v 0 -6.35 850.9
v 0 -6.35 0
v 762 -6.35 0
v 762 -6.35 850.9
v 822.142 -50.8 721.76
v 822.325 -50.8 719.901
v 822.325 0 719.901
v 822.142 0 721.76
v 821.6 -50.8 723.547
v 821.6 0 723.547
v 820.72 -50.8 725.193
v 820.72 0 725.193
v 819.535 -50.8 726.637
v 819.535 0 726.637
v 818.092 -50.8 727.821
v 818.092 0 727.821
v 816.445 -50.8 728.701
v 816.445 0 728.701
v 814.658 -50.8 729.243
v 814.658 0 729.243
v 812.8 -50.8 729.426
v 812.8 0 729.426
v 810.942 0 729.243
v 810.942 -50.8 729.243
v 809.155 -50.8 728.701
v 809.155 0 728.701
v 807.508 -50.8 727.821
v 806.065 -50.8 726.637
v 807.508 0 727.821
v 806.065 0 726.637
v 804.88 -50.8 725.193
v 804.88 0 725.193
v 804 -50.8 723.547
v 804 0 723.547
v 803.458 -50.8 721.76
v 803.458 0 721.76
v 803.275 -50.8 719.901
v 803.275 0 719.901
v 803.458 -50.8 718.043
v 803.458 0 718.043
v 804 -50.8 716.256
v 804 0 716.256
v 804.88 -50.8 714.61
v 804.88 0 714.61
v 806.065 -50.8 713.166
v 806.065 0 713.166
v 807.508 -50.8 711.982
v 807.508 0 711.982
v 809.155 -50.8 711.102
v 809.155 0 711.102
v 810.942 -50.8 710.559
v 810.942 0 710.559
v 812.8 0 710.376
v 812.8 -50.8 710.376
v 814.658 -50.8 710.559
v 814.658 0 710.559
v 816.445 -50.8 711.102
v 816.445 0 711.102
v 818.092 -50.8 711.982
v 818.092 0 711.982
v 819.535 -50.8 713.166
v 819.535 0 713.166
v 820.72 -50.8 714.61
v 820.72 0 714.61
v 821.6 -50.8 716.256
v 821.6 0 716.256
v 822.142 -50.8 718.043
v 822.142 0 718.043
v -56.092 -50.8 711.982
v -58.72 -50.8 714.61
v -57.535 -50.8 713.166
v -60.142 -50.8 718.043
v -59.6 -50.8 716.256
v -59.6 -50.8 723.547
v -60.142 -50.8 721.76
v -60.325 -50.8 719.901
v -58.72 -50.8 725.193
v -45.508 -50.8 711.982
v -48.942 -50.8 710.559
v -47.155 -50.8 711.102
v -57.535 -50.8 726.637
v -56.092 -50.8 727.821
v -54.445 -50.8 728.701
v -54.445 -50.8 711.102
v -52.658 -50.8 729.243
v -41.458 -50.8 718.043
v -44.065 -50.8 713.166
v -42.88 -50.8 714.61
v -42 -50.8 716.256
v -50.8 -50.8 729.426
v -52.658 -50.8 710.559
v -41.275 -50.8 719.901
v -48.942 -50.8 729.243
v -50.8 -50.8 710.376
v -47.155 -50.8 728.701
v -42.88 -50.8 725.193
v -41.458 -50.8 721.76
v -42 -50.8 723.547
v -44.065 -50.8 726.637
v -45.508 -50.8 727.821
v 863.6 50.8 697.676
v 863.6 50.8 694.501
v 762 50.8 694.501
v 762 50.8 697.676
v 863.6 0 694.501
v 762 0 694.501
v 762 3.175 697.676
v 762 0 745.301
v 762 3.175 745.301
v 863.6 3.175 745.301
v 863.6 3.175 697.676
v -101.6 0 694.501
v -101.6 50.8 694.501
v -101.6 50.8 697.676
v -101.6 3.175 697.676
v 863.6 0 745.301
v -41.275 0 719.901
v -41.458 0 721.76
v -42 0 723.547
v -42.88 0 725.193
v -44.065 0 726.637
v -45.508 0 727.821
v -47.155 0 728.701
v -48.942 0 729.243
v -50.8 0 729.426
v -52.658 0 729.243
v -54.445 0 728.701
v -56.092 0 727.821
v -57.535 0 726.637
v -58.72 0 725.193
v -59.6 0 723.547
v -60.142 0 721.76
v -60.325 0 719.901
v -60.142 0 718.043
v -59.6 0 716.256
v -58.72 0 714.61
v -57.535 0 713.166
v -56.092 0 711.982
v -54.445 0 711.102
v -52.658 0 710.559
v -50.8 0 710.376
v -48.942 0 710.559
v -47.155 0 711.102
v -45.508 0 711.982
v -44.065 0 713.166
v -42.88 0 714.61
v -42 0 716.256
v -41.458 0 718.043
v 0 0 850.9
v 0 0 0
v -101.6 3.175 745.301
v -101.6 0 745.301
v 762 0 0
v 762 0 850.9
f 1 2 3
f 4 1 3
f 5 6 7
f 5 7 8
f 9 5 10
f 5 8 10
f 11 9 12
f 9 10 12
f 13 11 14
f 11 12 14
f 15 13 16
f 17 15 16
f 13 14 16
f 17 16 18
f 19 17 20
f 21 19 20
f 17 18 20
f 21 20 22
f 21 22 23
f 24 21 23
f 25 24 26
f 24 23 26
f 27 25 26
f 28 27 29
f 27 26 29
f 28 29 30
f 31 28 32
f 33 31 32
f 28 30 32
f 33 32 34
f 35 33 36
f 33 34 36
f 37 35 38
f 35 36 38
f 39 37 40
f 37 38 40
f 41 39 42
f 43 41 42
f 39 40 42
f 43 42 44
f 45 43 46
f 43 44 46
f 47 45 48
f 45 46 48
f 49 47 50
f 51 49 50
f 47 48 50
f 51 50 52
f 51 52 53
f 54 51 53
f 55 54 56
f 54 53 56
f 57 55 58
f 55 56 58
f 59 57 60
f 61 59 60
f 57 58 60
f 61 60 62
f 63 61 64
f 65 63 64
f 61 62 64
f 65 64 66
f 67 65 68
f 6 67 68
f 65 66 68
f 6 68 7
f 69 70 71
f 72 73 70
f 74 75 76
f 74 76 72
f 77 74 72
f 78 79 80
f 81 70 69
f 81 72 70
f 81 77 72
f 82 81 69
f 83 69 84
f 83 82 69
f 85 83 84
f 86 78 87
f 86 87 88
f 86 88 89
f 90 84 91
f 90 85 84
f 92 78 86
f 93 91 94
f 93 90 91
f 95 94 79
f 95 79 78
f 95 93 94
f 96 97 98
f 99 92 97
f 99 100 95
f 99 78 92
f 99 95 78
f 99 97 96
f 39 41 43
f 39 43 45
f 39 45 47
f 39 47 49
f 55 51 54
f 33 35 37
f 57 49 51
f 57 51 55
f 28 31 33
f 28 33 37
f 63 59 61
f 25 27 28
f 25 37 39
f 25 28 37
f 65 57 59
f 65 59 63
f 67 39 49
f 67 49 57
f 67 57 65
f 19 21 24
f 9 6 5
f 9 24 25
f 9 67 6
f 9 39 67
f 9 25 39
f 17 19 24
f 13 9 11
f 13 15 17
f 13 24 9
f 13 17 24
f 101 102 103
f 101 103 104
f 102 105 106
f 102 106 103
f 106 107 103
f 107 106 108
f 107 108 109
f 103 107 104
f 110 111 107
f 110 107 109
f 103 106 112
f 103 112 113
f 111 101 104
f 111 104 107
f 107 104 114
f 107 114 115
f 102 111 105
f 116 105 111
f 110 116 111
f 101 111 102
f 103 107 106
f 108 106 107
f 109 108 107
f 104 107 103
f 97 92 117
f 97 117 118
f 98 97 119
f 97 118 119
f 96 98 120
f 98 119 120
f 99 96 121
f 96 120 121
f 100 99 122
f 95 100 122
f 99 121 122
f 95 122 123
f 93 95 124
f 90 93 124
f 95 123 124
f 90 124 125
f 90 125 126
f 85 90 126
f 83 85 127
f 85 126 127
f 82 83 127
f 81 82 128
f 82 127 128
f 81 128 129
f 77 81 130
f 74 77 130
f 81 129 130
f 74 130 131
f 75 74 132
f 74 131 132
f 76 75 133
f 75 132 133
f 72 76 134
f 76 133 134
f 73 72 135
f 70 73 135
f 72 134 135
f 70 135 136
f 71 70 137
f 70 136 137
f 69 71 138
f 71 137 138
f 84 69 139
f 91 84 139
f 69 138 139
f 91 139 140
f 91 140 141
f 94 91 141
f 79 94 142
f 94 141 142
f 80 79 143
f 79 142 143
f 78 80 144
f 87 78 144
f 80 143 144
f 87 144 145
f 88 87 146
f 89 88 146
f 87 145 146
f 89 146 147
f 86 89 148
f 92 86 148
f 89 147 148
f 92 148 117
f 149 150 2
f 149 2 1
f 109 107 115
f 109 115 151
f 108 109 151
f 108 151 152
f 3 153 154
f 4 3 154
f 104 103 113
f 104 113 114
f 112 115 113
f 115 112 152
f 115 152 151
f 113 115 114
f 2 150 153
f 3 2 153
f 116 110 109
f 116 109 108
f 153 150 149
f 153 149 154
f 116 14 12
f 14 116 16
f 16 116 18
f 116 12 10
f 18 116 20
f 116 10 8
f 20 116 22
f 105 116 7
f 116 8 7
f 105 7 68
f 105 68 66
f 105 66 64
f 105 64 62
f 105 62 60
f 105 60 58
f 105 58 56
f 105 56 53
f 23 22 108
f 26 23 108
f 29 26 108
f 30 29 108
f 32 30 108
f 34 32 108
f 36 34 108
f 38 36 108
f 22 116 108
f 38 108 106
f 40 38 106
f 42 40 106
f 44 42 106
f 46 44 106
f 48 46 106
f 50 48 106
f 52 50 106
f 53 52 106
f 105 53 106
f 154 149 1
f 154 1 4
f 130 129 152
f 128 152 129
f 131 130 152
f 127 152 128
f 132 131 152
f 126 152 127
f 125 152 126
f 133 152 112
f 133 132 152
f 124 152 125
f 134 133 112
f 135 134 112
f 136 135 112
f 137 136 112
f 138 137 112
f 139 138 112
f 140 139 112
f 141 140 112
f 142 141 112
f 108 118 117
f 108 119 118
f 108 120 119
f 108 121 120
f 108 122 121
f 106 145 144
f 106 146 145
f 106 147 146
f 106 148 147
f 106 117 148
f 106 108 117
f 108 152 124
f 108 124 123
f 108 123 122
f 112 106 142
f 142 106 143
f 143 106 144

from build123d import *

# Parameters (mm, degrees)
F0_W      = 762
F0_H      = 850.9
F1_DEPTH  = 6.35
F3_DEPTH  = 101.6
F4_DEPTH  = 863.6
F5_R      = 9.525
F6_DEPTH  = 50.8
F7_R      = 9.525
F8_DEPTH  = 50.8
F11_DEPTH = 101.6
F12_DEPTH = 863.6
F13_R     = 9.525
F14_DEPTH = 50.8
F15_R     = 9.525
F16_DEPTH = 50.8


with BuildPart() as f1:
    # F0 (on Front) → F1 (new body)
    with BuildSketch(Plane.XZ):
        with Locations((381, 425.45)):
            Rectangle(F0_W, F0_H)
    extrude(amount=F1_DEPTH)


with BuildPart() as f3:
    # F2 (on face) → F3 (new body)
    with BuildSketch(Plane.YZ.offset(762)):
        Polygon((0, 674.259339), (0, 623.459339), (3.175, 623.459339), (3.175, 671.084339), (50.8, 671.084339), (50.8, 674.259339), align=None)
    extrude(amount=F3_DEPTH)

    # F5 (on face) → F6 (join)
    with BuildSketch(Plane.XZ):
        with Locations((812.8, 648.859339)):
            Circle(F5_R)
    extrude(amount=F6_DEPTH)


with BuildPart() as f4:
    # F2 (on face) → F4 (new body)
    with BuildSketch(Plane.YZ.offset(762)):
        Polygon((0, 674.259339), (0, 623.459339), (3.175, 623.459339), (3.175, 671.084339), (50.8, 671.084339), (50.8, 674.259339), align=None)
    extrude(amount=-F4_DEPTH)

    # F7 (on face) → F8 (join)
    with BuildSketch(Plane.XZ):
        with Locations((-50.8, 648.859339)):
            Circle(F7_R)
    extrude(amount=F8_DEPTH)


with BuildPart() as f11:
    # F10 (on face) → F11 (new body)
    with BuildSketch(Plane.YZ.offset(762)):
        Polygon((0, 745.30146), (0, 694.50146), (50.8, 694.50146), (50.8, 697.67646), (3.175, 697.67646), (3.175, 745.30146), align=None)
    extrude(amount=F11_DEPTH)

    # F13 (on face) → F14 (join)
    with BuildSketch(Plane.XZ):
        with Locations((812.8, 719.90146)):
            Circle(F13_R)
    extrude(amount=F14_DEPTH)


with BuildPart() as f12:
    # F10 (on face) → F12 (new body)
    with BuildSketch(Plane.YZ.offset(762)):
        Polygon((0, 745.30146), (0, 694.50146), (50.8, 694.50146), (50.8, 697.67646), (3.175, 697.67646), (3.175, 745.30146), align=None)
    extrude(amount=-F12_DEPTH)

    # F15 (on face) → F16 (join)
    with BuildSketch(Plane.XZ):
        with Locations((-50.8, 719.90146)):
            Circle(F15_R)
    extrude(amount=F16_DEPTH)


solid = Compound([f1.part, f11.part, f12.part])
